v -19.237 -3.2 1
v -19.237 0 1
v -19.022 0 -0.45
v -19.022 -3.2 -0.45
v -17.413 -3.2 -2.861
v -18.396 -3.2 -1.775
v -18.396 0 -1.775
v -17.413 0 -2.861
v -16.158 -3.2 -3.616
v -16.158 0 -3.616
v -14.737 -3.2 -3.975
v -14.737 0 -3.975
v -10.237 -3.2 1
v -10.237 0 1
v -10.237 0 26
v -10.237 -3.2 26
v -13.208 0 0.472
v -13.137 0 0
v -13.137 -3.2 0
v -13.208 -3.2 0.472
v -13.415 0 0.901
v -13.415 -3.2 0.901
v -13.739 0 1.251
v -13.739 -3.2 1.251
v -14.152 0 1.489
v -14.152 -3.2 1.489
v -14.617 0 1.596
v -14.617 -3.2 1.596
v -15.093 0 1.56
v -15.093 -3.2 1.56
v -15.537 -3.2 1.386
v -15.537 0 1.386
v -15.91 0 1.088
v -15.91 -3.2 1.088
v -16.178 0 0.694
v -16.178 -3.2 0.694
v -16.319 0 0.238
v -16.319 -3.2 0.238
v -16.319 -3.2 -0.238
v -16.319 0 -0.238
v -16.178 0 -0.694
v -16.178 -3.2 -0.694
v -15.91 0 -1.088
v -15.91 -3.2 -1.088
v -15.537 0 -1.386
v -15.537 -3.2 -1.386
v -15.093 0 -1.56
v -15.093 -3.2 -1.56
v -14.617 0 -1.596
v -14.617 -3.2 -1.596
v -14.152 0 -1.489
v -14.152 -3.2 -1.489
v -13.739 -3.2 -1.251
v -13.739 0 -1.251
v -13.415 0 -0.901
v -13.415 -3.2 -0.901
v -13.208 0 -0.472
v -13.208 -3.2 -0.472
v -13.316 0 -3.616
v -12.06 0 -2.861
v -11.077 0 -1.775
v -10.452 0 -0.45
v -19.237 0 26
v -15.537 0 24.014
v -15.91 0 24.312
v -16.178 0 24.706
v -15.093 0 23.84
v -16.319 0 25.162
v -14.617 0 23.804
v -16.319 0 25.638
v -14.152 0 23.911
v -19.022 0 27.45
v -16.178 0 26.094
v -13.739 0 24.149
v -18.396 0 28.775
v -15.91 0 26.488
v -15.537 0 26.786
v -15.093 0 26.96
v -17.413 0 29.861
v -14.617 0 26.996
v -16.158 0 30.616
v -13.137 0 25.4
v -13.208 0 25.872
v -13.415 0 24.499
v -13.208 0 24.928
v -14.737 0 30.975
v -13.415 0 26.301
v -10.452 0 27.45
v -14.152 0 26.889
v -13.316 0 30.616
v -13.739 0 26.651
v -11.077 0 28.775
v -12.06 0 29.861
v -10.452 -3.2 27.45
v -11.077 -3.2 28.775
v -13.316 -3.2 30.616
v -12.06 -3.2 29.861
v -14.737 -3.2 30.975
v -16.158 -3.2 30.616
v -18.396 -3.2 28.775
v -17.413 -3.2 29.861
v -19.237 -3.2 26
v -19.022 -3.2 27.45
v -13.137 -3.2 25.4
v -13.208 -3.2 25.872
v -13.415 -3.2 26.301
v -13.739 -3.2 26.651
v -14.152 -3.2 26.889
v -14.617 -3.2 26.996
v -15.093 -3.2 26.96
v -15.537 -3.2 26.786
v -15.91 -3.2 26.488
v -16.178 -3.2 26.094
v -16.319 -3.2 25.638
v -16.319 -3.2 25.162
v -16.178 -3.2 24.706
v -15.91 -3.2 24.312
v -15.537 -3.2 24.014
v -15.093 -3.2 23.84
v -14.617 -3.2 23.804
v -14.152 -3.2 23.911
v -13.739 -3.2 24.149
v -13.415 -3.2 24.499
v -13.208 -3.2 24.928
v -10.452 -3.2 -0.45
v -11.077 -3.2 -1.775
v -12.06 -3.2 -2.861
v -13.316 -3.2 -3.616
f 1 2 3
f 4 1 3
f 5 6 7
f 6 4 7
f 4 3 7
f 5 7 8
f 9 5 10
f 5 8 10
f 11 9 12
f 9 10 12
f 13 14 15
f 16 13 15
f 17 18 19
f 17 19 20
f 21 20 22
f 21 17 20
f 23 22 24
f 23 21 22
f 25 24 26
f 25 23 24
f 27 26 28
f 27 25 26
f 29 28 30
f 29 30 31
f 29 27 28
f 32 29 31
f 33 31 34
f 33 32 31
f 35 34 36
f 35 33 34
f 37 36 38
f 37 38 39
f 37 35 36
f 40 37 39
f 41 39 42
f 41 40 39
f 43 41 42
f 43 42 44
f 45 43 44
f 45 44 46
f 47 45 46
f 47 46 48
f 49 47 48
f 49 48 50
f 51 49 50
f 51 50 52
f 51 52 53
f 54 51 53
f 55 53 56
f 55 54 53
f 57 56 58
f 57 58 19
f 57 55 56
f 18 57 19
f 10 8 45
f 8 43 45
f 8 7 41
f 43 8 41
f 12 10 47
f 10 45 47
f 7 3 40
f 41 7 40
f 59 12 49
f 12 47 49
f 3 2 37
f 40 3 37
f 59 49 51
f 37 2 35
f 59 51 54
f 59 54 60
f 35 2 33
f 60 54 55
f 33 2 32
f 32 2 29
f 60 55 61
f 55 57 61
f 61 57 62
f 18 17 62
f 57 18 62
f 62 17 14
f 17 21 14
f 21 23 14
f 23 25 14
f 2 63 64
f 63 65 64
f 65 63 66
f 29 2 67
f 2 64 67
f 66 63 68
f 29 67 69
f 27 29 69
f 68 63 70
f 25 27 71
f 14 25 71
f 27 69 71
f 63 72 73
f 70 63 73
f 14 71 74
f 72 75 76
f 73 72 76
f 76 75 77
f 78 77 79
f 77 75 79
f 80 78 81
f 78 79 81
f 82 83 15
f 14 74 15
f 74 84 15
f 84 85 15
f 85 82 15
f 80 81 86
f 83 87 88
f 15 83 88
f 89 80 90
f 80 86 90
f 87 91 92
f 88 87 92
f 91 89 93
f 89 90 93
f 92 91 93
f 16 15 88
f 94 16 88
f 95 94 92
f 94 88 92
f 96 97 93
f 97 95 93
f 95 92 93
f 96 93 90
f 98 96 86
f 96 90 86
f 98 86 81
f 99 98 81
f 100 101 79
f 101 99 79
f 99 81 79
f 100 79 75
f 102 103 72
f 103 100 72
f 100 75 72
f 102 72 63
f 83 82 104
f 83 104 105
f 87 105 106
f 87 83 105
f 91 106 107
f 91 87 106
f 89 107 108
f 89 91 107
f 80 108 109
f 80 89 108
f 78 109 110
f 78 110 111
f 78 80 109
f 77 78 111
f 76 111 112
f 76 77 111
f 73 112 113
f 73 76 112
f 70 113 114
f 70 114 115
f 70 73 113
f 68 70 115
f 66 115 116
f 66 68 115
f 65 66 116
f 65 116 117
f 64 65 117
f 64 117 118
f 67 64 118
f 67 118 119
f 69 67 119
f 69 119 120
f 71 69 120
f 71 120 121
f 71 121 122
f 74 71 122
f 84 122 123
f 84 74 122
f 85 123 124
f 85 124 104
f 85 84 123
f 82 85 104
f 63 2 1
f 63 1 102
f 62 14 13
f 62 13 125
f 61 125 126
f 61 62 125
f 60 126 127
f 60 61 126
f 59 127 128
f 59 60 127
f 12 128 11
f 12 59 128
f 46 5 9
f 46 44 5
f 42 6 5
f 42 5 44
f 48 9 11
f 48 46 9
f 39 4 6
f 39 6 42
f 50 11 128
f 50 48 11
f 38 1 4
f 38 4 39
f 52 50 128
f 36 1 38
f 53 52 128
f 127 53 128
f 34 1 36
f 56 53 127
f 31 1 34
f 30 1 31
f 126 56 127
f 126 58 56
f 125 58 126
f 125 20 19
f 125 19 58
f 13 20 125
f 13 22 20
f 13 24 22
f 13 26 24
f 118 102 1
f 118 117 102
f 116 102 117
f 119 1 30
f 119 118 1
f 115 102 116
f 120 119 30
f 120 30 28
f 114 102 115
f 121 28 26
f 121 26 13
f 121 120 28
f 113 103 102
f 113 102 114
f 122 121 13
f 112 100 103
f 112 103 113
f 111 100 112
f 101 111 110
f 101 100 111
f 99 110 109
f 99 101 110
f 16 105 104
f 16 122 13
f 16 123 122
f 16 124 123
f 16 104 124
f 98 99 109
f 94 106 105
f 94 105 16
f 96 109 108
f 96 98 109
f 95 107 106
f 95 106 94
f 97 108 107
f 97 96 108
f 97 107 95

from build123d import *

# Parameters (mm, degrees)
F0_W        = 9
F0_H        = 35
F0_R        = 1.6
F1_DEPTH    = 3.2
F2_T1_DEPTH = 28.2


# Not quite as in the source:
# - a fillet or chamfer that OpenCascade refuses, or shapes differently, is made with other operations: its cross-section is extruded or revolved along the edge and cut away or added


with BuildPart() as f1:
    # F0 (on Front) → F1 (new body)
    with BuildSketch(Plane.XZ):
        with Locations((-14.7368423641, 13.5)):
            Rectangle(F0_W, F0_H)
        with Locations((-14.7368423641, 0)):
            Circle(F0_R, mode=Mode.SUBTRACT)
        with Locations((-14.7368423641, 25.4)):
            Circle(F0_R, mode=Mode.SUBTRACT)
    extrude(amount=F1_DEPTH)

    # F2: fillet of radius 5 on 4 edges, made by hand

    # F2_s2 → F2_t1 (cut)
    with BuildSketch(Plane.XZ.offset(-12.5)):
        with BuildLine():
            ThreePointArc((-10.2368423641, 26), (-11.7013084581, 29.5355339059), (-15.2368423641, 31))
            Line((-15.2368423641, 31), (-10.2368423641, 31))
            Line((-10.2368423641, 31), (-10.2368423641, 26))
        make_face()
        with BuildLine():
            ThreePointArc((-14.2368423641, 31), (-17.77237627, 29.5355339059), (-19.2368423641, 26))
            Line((-19.2368423641, 26), (-19.2368423641, 31))
            Line((-19.2368423641, 31), (-14.2368423641, 31))
        make_face()
        with BuildLine():
            ThreePointArc((-10.2368423641, 1), (-11.7013084581, -2.5355339059), (-15.2368423641, -4))
            Line((-15.2368423641, -4), (-10.2368423641, -4))
            Line((-10.2368423641, -4), (-10.2368423641, 1))
        make_face()
        with BuildLine():
            ThreePointArc((-19.2368423641, 1), (-17.77237627, -2.5355339059), (-14.2368423641, -4))
            Line((-14.2368423641, -4), (-19.2368423641, -4))
            Line((-19.2368423641, -4), (-19.2368423641, 1))
        make_face()
    extrude(amount=F2_T1_DEPTH, mode=Mode.SUBTRACT)


solid = f1.part
